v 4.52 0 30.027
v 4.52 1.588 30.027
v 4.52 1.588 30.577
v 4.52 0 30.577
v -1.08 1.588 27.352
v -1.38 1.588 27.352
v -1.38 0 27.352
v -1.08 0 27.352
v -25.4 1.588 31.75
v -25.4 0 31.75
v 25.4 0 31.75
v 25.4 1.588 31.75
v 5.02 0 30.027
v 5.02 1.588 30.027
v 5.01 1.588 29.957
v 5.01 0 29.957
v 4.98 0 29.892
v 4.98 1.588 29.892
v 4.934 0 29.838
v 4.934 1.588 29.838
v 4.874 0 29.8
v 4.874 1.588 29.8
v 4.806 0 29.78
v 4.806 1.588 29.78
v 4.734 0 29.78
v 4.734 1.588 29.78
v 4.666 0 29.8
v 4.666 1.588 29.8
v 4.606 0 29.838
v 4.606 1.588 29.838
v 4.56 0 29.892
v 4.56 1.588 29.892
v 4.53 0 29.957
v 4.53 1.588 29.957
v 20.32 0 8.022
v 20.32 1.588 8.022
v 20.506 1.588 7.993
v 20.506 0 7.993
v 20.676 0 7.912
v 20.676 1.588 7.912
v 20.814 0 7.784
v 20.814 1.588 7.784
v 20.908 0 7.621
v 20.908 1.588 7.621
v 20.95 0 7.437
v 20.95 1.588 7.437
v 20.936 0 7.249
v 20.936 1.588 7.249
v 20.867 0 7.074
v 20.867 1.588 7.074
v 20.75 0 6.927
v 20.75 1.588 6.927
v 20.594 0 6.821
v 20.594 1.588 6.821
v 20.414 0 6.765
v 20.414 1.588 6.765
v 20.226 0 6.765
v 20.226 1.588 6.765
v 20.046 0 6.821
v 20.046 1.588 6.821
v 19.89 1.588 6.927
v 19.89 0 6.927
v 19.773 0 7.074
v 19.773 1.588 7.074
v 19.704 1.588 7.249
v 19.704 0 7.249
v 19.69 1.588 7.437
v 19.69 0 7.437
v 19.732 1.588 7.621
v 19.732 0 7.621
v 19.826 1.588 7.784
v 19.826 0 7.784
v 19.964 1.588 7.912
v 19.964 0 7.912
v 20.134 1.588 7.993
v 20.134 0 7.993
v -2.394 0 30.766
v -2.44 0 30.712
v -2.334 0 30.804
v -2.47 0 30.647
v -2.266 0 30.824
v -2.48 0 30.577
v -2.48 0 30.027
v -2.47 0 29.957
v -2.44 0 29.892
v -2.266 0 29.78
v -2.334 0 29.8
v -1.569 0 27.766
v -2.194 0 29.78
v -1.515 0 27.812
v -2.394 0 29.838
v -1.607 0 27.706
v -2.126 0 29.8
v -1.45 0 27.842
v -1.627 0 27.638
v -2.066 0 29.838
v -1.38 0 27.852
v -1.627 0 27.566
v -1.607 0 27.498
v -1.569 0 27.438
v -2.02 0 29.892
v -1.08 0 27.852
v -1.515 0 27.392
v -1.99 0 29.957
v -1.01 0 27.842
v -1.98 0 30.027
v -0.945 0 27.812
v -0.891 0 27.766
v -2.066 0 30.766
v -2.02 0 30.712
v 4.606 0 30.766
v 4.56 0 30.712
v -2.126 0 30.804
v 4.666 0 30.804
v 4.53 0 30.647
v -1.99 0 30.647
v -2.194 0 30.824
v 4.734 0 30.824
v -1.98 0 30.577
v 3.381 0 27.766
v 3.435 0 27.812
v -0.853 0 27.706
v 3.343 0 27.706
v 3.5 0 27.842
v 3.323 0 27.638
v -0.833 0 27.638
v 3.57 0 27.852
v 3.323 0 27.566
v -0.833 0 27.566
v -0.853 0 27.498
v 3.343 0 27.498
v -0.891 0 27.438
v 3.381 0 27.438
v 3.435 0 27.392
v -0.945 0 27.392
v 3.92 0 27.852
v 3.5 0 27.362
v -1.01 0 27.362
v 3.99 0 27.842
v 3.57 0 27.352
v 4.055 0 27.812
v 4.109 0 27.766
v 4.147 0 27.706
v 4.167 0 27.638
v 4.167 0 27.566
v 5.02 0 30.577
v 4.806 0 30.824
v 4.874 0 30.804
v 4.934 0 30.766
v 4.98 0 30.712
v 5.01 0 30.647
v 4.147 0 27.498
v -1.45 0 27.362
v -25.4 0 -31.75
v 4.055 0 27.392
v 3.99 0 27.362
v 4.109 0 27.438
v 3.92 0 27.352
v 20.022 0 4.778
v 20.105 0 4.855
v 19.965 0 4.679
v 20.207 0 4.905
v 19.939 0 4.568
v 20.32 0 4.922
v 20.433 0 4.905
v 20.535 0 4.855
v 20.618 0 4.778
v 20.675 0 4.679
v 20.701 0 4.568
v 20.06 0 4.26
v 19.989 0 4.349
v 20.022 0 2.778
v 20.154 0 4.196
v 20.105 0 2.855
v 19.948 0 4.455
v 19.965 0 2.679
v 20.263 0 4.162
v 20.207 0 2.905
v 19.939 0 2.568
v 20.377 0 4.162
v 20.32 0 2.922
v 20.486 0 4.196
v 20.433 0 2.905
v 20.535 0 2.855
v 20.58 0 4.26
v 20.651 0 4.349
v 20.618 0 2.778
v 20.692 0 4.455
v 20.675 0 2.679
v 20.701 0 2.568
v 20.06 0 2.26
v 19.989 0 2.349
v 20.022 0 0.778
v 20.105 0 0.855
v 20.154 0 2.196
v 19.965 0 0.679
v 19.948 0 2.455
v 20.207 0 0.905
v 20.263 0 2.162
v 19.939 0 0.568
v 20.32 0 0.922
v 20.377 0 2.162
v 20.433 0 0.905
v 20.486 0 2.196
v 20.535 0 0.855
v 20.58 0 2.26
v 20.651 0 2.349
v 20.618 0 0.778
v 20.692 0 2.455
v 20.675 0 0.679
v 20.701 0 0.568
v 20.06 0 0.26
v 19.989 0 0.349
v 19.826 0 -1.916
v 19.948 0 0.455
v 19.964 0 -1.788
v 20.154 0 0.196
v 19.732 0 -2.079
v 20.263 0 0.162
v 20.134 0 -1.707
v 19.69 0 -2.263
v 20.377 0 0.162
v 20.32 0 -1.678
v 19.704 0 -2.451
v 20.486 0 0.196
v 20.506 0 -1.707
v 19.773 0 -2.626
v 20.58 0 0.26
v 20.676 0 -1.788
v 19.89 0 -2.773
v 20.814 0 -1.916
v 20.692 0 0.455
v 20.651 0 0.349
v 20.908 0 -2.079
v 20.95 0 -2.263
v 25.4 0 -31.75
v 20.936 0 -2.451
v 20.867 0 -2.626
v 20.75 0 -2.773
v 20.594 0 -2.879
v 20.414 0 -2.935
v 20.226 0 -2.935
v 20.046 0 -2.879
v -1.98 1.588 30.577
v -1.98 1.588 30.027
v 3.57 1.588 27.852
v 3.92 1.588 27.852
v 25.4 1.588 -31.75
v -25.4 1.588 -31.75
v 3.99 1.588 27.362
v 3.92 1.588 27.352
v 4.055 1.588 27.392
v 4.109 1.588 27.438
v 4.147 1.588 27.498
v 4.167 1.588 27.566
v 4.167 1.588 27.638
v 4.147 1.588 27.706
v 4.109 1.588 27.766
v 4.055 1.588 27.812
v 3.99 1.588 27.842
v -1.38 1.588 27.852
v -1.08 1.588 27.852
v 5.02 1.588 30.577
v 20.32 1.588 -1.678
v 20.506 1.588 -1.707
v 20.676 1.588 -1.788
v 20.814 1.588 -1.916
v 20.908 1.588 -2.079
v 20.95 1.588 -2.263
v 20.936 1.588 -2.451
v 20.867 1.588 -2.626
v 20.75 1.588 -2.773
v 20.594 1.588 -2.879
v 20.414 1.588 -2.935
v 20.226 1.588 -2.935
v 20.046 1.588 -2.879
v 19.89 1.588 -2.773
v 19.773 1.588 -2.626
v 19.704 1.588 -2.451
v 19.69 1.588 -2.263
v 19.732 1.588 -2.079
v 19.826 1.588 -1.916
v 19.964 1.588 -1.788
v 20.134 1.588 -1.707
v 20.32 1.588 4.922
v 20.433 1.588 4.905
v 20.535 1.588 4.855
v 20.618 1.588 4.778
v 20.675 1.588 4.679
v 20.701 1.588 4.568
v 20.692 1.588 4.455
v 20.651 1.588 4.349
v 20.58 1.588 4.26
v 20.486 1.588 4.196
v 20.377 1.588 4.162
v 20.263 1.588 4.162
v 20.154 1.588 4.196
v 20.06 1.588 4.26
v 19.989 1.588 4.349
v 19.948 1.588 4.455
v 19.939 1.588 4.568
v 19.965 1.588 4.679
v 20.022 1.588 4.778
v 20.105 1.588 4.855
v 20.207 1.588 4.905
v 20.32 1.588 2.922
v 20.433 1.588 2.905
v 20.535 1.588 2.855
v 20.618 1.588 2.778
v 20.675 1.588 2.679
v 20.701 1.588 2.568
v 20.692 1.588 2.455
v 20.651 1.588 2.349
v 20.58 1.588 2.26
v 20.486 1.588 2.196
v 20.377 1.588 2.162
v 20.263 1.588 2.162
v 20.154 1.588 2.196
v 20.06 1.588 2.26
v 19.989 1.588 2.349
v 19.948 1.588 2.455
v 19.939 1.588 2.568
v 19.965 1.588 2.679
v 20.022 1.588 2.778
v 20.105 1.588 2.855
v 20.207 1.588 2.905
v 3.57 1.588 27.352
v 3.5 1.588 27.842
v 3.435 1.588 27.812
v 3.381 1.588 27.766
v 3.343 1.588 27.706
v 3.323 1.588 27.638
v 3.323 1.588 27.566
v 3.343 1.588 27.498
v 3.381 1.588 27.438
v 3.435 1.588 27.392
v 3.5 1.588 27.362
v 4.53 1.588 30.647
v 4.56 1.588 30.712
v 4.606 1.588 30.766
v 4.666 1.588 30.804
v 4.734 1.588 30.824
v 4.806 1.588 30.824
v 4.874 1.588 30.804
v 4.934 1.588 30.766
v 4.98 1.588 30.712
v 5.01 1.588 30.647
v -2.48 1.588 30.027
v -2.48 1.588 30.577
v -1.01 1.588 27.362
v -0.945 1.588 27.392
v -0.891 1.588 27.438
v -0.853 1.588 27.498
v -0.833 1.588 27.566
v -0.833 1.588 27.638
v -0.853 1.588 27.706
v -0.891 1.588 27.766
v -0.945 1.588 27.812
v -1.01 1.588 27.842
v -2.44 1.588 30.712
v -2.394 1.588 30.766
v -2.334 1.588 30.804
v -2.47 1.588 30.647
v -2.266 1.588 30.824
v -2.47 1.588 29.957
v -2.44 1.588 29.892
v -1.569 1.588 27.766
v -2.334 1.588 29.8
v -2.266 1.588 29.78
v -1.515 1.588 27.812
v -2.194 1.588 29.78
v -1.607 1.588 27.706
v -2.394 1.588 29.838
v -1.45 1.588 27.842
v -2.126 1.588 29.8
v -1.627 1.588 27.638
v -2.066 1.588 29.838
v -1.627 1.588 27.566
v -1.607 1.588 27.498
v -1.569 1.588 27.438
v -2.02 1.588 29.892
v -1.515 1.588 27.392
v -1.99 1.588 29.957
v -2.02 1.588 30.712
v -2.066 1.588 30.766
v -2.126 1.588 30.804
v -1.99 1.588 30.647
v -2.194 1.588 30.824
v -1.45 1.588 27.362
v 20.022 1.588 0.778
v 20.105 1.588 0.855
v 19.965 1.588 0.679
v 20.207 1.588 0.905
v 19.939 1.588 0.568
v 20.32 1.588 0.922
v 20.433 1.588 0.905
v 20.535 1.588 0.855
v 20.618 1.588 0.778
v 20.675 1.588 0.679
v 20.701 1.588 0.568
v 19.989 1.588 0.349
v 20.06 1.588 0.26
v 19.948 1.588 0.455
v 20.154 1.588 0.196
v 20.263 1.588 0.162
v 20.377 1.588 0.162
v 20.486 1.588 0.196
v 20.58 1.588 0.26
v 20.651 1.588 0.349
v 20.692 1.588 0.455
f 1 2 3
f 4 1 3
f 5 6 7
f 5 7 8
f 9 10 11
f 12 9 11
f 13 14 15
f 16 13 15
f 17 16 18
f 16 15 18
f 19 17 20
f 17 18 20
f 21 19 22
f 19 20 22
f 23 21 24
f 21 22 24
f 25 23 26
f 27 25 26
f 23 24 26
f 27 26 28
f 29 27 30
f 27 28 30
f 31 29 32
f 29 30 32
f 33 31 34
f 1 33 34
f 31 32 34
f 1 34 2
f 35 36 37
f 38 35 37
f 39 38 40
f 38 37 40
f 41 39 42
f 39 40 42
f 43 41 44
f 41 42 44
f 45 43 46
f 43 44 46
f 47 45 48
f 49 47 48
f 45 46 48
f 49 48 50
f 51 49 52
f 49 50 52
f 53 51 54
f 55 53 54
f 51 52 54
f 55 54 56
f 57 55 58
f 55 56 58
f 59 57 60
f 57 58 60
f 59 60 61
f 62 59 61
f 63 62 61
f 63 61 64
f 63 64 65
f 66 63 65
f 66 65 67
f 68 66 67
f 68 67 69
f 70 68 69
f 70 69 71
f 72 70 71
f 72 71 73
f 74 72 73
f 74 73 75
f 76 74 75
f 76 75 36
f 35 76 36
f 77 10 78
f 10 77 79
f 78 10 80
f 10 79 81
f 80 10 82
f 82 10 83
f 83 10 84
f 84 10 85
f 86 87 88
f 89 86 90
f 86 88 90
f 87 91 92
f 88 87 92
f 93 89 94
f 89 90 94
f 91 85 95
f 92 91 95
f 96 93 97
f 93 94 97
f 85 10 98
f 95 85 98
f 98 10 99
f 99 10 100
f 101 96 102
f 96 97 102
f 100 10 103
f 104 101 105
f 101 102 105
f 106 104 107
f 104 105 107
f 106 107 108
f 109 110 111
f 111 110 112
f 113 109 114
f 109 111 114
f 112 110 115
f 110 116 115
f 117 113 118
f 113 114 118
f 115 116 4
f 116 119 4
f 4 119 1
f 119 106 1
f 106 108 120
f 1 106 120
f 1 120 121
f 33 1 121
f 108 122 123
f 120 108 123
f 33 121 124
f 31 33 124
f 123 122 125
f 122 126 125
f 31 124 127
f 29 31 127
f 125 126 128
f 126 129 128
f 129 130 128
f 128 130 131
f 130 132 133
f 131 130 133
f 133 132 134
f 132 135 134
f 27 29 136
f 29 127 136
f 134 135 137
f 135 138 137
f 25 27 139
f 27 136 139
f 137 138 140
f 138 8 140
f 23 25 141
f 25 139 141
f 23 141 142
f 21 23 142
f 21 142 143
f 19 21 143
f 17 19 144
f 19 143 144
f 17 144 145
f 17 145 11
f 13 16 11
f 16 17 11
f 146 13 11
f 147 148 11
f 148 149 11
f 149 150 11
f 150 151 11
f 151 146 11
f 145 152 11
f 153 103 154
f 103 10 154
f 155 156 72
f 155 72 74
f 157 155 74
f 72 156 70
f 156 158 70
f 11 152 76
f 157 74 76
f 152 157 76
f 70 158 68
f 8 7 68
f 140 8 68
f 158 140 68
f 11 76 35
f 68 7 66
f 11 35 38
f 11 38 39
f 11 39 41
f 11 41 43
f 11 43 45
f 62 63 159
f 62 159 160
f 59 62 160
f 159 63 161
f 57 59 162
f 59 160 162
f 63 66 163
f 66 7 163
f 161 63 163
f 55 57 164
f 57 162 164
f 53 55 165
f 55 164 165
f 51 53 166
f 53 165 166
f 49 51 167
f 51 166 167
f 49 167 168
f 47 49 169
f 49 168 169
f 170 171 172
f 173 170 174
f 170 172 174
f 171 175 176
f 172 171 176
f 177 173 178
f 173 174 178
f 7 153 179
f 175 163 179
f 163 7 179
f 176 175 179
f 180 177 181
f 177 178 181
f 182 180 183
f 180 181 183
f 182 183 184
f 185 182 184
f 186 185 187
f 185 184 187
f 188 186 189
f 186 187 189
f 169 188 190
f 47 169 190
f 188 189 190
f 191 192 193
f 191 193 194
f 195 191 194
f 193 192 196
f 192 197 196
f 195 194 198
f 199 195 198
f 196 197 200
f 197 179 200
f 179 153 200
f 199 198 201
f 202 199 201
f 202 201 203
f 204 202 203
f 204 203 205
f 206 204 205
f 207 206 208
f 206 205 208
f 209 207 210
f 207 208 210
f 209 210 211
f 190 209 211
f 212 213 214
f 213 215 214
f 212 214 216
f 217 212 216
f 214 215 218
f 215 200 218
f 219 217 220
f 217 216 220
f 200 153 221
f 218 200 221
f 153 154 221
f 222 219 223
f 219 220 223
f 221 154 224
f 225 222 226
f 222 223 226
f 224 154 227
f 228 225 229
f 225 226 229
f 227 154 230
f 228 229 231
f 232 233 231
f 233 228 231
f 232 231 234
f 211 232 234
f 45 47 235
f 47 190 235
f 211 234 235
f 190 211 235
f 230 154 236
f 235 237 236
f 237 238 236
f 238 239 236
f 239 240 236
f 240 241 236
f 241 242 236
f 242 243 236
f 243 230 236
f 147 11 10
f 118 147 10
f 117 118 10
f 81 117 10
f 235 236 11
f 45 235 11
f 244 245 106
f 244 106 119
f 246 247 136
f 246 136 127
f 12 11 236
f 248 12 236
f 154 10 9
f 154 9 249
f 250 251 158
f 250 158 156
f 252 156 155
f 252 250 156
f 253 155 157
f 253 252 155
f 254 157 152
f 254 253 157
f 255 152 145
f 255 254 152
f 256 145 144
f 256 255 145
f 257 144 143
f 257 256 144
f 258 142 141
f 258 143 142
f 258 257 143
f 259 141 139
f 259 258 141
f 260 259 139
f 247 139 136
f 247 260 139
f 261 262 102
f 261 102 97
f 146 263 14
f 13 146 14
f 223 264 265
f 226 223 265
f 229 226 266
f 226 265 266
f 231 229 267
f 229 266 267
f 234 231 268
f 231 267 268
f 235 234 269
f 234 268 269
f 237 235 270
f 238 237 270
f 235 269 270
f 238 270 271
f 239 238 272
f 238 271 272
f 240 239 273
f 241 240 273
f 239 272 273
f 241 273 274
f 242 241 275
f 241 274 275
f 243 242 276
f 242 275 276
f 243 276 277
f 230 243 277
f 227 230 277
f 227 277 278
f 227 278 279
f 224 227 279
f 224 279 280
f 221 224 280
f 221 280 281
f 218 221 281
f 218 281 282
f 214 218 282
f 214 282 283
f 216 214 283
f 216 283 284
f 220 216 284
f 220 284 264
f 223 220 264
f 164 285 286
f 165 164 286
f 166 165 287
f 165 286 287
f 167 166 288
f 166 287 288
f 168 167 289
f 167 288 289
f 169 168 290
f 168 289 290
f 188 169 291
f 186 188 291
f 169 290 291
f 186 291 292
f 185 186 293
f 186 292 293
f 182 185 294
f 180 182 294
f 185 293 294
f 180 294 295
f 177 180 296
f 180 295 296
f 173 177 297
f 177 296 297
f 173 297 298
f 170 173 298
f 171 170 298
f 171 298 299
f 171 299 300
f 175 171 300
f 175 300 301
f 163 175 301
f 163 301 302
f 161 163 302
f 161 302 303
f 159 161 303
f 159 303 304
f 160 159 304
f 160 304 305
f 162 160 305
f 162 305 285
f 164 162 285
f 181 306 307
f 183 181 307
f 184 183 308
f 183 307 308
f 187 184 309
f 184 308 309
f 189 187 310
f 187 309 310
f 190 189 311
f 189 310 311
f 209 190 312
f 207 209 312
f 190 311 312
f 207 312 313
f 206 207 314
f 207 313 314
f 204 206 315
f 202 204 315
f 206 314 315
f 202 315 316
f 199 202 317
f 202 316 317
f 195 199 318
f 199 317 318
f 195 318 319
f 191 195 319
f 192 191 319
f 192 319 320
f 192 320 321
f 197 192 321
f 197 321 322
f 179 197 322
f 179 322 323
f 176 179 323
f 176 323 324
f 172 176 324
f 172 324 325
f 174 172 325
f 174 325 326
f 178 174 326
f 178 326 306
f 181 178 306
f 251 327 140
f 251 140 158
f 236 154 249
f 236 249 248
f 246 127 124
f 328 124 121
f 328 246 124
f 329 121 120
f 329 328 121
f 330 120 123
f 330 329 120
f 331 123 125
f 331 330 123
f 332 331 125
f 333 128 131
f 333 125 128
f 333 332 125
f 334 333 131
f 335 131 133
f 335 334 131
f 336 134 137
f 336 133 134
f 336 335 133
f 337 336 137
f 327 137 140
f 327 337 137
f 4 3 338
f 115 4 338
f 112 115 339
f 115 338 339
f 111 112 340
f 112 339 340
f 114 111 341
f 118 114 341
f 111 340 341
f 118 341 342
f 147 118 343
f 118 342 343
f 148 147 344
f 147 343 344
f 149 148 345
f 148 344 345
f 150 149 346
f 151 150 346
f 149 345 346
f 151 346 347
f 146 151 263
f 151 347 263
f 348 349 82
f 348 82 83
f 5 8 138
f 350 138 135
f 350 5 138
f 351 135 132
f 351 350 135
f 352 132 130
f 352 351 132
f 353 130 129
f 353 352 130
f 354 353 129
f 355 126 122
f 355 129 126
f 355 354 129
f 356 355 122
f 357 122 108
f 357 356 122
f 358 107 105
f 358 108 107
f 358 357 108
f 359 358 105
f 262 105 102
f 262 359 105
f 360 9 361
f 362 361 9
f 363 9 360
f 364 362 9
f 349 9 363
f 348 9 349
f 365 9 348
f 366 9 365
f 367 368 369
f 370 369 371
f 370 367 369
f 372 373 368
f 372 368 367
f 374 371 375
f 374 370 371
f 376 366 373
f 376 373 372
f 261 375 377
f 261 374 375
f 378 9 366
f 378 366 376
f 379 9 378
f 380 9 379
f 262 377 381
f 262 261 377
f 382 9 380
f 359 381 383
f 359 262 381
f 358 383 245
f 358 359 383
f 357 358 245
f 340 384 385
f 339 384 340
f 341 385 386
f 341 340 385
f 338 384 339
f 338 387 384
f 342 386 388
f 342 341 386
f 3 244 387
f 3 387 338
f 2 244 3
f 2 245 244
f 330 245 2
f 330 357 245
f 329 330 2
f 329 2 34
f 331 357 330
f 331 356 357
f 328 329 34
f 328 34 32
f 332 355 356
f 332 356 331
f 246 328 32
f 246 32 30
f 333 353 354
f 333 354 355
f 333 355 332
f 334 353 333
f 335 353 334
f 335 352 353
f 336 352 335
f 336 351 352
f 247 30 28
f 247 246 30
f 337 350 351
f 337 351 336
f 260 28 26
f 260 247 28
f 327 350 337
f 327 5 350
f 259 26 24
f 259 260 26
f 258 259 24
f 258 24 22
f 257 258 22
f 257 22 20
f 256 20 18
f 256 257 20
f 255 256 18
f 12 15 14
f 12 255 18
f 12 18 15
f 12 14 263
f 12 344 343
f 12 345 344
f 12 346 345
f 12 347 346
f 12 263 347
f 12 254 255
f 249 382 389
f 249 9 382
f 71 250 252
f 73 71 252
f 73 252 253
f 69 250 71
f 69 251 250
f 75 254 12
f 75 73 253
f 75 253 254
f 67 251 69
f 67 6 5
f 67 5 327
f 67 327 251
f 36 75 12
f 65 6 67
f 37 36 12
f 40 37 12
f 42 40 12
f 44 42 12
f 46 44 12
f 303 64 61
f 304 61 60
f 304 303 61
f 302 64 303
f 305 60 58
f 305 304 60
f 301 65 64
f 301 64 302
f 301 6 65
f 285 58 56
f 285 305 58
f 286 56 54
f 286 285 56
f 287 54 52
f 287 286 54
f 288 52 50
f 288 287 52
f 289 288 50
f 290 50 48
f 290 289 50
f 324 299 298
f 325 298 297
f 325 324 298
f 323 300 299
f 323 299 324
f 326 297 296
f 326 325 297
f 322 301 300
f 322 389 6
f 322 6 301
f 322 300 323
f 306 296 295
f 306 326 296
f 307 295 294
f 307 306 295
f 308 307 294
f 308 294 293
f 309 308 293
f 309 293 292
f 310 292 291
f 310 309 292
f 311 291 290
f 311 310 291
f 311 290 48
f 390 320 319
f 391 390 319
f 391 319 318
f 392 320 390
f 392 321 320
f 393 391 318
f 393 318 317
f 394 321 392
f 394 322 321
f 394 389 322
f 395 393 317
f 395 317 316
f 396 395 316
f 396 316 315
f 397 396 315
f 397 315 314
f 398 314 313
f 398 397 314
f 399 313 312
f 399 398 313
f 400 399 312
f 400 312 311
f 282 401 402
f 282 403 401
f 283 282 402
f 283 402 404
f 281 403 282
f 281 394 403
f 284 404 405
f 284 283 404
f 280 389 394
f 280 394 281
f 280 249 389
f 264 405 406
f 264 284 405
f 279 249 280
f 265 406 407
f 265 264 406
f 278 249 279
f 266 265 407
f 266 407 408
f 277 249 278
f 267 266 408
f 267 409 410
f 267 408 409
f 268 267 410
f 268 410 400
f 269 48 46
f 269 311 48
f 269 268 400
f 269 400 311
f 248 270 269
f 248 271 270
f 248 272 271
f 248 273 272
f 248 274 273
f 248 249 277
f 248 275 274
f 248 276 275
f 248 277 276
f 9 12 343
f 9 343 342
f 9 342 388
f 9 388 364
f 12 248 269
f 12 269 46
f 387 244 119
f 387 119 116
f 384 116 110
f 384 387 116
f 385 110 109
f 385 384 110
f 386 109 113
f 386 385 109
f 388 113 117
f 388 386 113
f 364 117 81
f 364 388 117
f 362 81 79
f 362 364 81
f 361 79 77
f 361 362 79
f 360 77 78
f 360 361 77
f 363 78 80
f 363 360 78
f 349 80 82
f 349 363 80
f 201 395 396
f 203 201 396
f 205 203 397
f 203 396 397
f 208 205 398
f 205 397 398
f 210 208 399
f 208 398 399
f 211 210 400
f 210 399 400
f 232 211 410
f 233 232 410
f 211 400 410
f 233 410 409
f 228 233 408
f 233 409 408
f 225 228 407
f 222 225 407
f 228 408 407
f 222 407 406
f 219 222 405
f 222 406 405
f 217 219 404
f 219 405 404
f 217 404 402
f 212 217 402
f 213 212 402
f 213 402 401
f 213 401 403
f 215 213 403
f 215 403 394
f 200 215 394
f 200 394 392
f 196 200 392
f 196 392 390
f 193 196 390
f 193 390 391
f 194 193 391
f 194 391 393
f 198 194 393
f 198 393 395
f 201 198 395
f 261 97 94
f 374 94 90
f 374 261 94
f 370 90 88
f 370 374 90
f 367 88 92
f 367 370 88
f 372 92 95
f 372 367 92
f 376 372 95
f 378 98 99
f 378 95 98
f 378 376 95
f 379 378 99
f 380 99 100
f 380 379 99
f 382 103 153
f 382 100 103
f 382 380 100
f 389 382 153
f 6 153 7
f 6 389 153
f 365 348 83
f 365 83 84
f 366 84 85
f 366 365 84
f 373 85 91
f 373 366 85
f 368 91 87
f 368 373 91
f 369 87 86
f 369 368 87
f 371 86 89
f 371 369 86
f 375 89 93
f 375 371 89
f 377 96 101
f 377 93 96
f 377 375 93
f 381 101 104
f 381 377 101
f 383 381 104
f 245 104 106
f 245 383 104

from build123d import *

# Parameters (mm, degrees)
SKETCH1_W           = 50.8
SKETCH1_H           = 63.5
BOSS_EXTRUDE1_DEPTH = 1.5875
SKETCH3_R           = 0.63175007
SKETCH3_R_2         = 0.381749935
CUT_EXTRUDE4_DEPTH  = 41.690817837


with BuildPart() as part:
    # Sketch1 → Boss-Extrude1 (new body)
    with BuildSketch(Plane(origin=(0, 0, 0), x_dir=(1, 0, 0), z_dir=(0, 1, 0))):
        Rectangle(SKETCH1_W, SKETCH1_H)
    extrude(amount=BOSS_EXTRUDE1_DEPTH)

    # Sketch3 → Cut-Extrude4 (cut, through all)
    with BuildSketch(Plane(origin=(0, 1.5875, 0), x_dir=(1, 0, 0), z_dir=(0, 1, 0))):
        with Locations(Location((20.319988808, -7.389796086, 0), (0, 0, 270))):
            Circle(SKETCH3_R)
        with Locations(Location((20.319988808, -4.539796706, 0), (0, 0, 270))):
            Circle(SKETCH3_R_2)
        with Locations(Location((20.319988808, -2.539795626, 0), (0, 0, 270))):
            Circle(SKETCH3_R_2)
        with Locations(Location((20.319988808, -0.539794546, 0), (0, 0, 270))):
            Circle(SKETCH3_R_2)
        with Locations(Location((20.319988808, 2.310204834, 0), (0, 0, 270))):
            Circle(SKETCH3_R)
        with BuildLine():
            Line((-1.380010972, -27.351995811), (-1.080011572, -27.351995811))
            ThreePointArc((-1.080011572, -27.351995811), (-0.830011437, -27.601995946), (-1.080011572, -27.851996081))
            Line((-1.080011572, -27.851996081), (-1.380010972, -27.851996081))
            ThreePointArc((-1.380010972, -27.851996081), (-1.630011107, -27.601995946), (-1.380010972, -27.351995811))
        make_face()
        with BuildLine():
            Line((3.569989288, -27.351995811), (3.919988588, -27.351995811))
            ThreePointArc((3.919988588, -27.351995811), (4.169988723, -27.601995946), (3.919988588, -27.851996081))
            Line((3.919988588, -27.851996081), (3.569989288, -27.851996081))
            ThreePointArc((3.569989288, -27.851996081), (3.319989153, -27.601995946), (3.569989288, -27.351995811))
        make_face()
        with BuildLine():
            Line((4.519989293, -30.026994906), (4.519989293, -30.576996346))
            ThreePointArc((4.519989293, -30.576996346), (4.769989428, -30.826996481), (5.019989563, -30.576996346))
            Line((5.019989563, -30.576996346), (5.019989563, -30.026994906))
            ThreePointArc((5.019989563, -30.026994906), (4.769989428, -29.776994771), (4.519989293, -30.026994906))
        make_face()
        with BuildLine():
            Line((-1.980011677, -30.026994906), (-1.980011677, -30.576996346))
            ThreePointArc((-1.980011677, -30.576996346), (-2.230011812, -30.826996481), (-2.480011947, -30.576996346))
            Line((-2.480011947, -30.576996346), (-2.480011947, -30.026994906))
            ThreePointArc((-2.480011947, -30.026994906), (-2.230011812, -29.776994771), (-1.980011677, -30.026994906))
        make_face()
    extrude(amount=-CUT_EXTRUDE4_DEPTH, mode=Mode.SUBTRACT)


solid = part.part
